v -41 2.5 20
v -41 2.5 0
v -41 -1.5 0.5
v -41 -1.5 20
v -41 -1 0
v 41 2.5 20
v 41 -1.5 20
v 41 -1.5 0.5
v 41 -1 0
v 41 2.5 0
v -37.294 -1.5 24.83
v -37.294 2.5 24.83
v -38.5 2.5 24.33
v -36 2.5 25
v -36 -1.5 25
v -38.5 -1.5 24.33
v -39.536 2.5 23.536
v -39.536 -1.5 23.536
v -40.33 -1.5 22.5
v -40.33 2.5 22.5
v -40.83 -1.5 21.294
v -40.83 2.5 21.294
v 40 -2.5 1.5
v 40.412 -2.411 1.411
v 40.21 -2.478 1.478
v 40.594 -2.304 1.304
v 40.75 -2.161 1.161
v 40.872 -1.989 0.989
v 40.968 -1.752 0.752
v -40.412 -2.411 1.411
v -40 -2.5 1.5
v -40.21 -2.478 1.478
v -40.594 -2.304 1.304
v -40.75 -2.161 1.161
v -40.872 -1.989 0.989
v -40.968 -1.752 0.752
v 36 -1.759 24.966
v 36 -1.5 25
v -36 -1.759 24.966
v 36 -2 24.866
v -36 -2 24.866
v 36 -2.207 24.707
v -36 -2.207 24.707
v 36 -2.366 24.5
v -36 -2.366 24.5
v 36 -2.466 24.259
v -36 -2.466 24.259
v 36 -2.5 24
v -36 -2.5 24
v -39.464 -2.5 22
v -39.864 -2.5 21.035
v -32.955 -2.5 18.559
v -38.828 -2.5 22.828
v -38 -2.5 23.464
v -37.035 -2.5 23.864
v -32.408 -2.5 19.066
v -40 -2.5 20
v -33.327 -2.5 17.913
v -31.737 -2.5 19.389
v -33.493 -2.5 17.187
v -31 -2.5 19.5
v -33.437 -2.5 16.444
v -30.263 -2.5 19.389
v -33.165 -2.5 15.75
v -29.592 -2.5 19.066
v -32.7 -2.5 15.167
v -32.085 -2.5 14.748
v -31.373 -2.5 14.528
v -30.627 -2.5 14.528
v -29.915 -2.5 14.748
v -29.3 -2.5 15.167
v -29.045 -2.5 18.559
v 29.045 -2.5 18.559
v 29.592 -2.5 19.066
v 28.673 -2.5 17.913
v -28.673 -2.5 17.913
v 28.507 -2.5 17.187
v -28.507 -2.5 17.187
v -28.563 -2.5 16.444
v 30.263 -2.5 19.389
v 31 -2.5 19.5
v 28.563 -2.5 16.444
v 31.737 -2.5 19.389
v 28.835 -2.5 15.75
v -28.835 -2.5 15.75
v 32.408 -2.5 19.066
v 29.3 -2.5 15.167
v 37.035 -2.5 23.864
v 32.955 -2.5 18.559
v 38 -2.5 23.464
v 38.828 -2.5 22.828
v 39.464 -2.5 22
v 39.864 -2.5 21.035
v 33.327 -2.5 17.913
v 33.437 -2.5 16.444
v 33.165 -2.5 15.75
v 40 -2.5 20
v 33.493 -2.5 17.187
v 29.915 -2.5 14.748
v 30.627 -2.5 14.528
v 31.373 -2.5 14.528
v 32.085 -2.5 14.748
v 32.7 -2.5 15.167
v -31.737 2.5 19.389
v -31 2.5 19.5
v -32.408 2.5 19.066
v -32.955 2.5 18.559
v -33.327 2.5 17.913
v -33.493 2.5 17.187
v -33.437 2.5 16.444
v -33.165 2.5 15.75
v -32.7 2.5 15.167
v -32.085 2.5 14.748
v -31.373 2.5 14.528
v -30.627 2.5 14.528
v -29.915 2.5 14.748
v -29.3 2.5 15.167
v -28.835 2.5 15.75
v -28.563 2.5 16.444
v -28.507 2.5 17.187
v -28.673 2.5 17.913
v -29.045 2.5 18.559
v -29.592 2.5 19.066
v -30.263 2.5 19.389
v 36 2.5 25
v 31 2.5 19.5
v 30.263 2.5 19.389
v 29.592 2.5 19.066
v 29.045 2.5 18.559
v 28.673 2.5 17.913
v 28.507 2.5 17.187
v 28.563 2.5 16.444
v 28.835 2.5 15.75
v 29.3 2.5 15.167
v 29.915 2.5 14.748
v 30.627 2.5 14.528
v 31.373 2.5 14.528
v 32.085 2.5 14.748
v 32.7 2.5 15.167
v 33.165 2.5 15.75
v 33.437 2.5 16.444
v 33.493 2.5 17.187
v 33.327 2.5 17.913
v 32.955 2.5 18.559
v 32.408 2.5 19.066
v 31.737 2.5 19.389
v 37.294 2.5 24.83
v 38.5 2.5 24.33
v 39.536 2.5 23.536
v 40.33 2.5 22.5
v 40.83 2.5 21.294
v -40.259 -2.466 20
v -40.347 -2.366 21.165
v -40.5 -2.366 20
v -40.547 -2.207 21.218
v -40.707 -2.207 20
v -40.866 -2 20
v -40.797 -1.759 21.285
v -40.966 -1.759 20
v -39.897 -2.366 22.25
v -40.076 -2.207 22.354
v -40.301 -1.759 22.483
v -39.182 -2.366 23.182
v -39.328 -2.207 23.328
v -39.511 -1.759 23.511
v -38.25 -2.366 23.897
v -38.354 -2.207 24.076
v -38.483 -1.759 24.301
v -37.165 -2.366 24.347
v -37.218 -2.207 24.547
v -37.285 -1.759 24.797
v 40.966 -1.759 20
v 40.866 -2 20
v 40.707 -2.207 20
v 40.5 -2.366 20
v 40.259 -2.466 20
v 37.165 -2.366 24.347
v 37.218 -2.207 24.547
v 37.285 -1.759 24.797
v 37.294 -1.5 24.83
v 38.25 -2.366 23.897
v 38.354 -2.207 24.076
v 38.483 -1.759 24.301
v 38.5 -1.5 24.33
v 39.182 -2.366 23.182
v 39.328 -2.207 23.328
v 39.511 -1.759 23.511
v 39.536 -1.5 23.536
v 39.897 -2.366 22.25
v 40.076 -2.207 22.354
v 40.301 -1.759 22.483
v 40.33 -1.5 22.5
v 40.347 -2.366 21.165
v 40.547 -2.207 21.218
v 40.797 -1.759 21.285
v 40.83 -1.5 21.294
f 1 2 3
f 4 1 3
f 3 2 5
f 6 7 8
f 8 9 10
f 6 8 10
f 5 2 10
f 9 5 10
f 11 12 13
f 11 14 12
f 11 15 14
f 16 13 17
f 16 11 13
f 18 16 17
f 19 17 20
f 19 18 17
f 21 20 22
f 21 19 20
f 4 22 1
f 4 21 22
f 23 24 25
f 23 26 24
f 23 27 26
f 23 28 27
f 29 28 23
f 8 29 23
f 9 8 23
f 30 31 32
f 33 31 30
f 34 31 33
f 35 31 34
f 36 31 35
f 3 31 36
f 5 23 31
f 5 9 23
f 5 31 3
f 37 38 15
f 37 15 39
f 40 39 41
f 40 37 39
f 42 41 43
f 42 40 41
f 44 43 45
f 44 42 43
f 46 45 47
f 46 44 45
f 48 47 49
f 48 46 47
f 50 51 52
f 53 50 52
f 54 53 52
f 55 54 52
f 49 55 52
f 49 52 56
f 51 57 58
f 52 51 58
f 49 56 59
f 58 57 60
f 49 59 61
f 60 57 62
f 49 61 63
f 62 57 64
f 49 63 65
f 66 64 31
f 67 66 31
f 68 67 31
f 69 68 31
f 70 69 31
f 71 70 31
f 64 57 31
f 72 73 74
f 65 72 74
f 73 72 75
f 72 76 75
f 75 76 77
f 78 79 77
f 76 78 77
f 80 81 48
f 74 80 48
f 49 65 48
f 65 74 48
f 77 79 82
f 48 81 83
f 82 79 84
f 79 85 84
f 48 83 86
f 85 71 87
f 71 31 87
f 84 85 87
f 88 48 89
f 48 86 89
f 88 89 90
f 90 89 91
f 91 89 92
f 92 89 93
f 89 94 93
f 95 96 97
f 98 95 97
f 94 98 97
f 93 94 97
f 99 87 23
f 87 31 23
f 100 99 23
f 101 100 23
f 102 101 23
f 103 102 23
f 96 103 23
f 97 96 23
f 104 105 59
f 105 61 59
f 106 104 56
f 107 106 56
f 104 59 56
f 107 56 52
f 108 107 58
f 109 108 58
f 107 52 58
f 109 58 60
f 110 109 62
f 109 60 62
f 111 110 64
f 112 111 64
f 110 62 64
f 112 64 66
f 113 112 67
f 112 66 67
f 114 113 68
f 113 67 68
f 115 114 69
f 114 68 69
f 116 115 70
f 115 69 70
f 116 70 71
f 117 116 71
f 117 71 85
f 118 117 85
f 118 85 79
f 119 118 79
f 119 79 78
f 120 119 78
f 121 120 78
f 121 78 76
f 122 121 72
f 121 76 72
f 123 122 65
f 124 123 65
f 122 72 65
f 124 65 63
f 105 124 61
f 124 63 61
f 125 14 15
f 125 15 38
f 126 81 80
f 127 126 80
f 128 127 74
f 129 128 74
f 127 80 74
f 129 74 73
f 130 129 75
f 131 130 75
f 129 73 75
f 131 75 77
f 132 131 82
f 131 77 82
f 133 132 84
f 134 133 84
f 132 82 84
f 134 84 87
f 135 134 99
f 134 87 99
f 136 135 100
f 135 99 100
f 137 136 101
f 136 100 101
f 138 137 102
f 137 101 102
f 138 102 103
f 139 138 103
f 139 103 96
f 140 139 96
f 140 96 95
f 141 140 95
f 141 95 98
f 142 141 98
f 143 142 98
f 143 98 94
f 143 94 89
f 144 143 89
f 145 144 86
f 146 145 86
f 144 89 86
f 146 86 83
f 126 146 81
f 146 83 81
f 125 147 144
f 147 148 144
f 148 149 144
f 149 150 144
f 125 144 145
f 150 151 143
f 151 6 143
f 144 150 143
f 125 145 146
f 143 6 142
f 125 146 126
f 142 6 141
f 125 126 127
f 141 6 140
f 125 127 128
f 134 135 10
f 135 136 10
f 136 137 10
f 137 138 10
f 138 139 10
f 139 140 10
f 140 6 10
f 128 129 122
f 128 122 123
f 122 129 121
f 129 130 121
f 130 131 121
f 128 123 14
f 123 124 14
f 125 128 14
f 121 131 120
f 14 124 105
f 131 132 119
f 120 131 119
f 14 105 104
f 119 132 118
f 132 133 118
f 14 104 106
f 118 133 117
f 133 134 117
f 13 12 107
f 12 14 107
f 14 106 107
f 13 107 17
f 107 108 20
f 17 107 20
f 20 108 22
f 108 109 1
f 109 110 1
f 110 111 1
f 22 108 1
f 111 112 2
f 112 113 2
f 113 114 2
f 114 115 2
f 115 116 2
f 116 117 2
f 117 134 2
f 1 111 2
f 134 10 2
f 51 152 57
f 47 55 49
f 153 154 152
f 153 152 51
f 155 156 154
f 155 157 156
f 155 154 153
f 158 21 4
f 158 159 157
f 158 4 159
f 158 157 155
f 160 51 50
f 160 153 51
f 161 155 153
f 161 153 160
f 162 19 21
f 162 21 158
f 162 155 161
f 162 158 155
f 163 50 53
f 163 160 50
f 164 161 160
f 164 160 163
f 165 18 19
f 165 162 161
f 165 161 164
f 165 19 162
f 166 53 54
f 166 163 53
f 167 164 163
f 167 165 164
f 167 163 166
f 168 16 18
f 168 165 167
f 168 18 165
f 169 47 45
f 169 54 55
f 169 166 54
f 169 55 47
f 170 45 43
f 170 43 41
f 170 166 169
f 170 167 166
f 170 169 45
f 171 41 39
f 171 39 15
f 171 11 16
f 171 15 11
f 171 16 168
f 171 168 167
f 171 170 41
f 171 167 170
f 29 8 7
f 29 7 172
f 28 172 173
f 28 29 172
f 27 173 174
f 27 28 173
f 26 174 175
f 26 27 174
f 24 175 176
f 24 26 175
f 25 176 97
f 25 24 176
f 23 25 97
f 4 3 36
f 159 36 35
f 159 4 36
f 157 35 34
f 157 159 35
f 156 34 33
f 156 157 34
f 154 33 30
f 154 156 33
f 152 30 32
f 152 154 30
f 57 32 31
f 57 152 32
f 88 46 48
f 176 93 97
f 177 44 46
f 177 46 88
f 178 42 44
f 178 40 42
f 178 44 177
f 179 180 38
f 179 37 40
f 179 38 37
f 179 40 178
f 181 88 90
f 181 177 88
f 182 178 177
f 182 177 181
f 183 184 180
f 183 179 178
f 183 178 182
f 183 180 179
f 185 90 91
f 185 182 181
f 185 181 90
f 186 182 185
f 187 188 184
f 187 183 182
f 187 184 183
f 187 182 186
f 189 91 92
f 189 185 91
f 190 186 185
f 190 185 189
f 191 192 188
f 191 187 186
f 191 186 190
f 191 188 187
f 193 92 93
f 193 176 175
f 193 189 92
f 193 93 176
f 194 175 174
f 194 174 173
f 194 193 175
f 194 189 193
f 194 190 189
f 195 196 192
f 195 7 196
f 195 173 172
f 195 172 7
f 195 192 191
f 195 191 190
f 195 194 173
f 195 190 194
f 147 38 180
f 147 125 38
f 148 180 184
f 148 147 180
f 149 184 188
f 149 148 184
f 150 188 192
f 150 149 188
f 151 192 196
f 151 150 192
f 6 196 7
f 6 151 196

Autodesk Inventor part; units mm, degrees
ref_plane "YZ Plane" through (0, 0, 0) normal (1, 0, 0) x (0, 1, 0)
ref_plane "XZ Plane" through (0, 0, 0) normal (0, 1, 0) x (-1, 0, 0)
ref_plane "XY Plane" through (0, 0, 0) normal (0, 0, 1) x (1, 0, 0)
sketch "Sketch1" plane through (0, 0, 0) normal (0, 0, 1) x (1, 0, 0)
  line L0 (-41, -2.5) -> (41, -2.5)
  line L1 (41, -2.5) -> (41, 2.5)
  line L2 (41, 2.5) -> (-41, 2.5)
  line L3 (-41, 2.5) -> (-41, -2.5)
  line L4 (-41, -2.5) -> (41, 2.5) construction
  line L5 (41, -2.5) -> (-41, 2.5) construction
  point P0 (0, 0)
  dimension "d0" = 82
  dimension "d1" = 5
extrude "Extrusion1" add sketch "Sketch1" along normal blind 25
chamfer "Chamfer1" distance 1.5 angle 45 1 edges at (0, -2.5, 0)
fillet "Fillet1" radius 5 2 edges at (-41, 0, 25) (41, 0, 25)
sketch "Sketch2" plane through (-41, 2.5, 0) normal (0, 1, 0) x (1, 0, 0)
  circle A0 centre (10, -17) radius 3 construction
  circle A1 centre (72, -17) radius 3 construction
  line L0 (77, -25) -> (5, -25) construction
  line L1 (0, 0) -> (0, -20) construction
  line L2 (82, 0) -> (82, -20) construction
  point P0 (41, 0)
  dimension "d8" = 6
  dimension "d9" = 6
  dimension "d10" = 8
  dimension "d11" = 10
  dimension "d12" = 10
  dimension "d13" = 8
hole "Hole1" at (-31, 2.5, 17) at (31, 2.5, 17) direction (0, -1, 0) diameter 5 end through all
thread "Thread1" size "M5x0.8" class "6H" standard "ANSI Metric M Profile" full length
thread "Thread2" size "M5x0.8" class "6H" standard "ANSI Metric M Profile" full length
fillet "Fillet2" radius 1 5 edges at (-39.5355, -2.5, 23.5355) (0, -2.5, 25) (39.5355, -2.5, 23.5355) (41, -2.5, 10.75) (-41, -2.5, 10.75)
properties part number "BearingHousing_Jack" material "Steel, Galvanized"
